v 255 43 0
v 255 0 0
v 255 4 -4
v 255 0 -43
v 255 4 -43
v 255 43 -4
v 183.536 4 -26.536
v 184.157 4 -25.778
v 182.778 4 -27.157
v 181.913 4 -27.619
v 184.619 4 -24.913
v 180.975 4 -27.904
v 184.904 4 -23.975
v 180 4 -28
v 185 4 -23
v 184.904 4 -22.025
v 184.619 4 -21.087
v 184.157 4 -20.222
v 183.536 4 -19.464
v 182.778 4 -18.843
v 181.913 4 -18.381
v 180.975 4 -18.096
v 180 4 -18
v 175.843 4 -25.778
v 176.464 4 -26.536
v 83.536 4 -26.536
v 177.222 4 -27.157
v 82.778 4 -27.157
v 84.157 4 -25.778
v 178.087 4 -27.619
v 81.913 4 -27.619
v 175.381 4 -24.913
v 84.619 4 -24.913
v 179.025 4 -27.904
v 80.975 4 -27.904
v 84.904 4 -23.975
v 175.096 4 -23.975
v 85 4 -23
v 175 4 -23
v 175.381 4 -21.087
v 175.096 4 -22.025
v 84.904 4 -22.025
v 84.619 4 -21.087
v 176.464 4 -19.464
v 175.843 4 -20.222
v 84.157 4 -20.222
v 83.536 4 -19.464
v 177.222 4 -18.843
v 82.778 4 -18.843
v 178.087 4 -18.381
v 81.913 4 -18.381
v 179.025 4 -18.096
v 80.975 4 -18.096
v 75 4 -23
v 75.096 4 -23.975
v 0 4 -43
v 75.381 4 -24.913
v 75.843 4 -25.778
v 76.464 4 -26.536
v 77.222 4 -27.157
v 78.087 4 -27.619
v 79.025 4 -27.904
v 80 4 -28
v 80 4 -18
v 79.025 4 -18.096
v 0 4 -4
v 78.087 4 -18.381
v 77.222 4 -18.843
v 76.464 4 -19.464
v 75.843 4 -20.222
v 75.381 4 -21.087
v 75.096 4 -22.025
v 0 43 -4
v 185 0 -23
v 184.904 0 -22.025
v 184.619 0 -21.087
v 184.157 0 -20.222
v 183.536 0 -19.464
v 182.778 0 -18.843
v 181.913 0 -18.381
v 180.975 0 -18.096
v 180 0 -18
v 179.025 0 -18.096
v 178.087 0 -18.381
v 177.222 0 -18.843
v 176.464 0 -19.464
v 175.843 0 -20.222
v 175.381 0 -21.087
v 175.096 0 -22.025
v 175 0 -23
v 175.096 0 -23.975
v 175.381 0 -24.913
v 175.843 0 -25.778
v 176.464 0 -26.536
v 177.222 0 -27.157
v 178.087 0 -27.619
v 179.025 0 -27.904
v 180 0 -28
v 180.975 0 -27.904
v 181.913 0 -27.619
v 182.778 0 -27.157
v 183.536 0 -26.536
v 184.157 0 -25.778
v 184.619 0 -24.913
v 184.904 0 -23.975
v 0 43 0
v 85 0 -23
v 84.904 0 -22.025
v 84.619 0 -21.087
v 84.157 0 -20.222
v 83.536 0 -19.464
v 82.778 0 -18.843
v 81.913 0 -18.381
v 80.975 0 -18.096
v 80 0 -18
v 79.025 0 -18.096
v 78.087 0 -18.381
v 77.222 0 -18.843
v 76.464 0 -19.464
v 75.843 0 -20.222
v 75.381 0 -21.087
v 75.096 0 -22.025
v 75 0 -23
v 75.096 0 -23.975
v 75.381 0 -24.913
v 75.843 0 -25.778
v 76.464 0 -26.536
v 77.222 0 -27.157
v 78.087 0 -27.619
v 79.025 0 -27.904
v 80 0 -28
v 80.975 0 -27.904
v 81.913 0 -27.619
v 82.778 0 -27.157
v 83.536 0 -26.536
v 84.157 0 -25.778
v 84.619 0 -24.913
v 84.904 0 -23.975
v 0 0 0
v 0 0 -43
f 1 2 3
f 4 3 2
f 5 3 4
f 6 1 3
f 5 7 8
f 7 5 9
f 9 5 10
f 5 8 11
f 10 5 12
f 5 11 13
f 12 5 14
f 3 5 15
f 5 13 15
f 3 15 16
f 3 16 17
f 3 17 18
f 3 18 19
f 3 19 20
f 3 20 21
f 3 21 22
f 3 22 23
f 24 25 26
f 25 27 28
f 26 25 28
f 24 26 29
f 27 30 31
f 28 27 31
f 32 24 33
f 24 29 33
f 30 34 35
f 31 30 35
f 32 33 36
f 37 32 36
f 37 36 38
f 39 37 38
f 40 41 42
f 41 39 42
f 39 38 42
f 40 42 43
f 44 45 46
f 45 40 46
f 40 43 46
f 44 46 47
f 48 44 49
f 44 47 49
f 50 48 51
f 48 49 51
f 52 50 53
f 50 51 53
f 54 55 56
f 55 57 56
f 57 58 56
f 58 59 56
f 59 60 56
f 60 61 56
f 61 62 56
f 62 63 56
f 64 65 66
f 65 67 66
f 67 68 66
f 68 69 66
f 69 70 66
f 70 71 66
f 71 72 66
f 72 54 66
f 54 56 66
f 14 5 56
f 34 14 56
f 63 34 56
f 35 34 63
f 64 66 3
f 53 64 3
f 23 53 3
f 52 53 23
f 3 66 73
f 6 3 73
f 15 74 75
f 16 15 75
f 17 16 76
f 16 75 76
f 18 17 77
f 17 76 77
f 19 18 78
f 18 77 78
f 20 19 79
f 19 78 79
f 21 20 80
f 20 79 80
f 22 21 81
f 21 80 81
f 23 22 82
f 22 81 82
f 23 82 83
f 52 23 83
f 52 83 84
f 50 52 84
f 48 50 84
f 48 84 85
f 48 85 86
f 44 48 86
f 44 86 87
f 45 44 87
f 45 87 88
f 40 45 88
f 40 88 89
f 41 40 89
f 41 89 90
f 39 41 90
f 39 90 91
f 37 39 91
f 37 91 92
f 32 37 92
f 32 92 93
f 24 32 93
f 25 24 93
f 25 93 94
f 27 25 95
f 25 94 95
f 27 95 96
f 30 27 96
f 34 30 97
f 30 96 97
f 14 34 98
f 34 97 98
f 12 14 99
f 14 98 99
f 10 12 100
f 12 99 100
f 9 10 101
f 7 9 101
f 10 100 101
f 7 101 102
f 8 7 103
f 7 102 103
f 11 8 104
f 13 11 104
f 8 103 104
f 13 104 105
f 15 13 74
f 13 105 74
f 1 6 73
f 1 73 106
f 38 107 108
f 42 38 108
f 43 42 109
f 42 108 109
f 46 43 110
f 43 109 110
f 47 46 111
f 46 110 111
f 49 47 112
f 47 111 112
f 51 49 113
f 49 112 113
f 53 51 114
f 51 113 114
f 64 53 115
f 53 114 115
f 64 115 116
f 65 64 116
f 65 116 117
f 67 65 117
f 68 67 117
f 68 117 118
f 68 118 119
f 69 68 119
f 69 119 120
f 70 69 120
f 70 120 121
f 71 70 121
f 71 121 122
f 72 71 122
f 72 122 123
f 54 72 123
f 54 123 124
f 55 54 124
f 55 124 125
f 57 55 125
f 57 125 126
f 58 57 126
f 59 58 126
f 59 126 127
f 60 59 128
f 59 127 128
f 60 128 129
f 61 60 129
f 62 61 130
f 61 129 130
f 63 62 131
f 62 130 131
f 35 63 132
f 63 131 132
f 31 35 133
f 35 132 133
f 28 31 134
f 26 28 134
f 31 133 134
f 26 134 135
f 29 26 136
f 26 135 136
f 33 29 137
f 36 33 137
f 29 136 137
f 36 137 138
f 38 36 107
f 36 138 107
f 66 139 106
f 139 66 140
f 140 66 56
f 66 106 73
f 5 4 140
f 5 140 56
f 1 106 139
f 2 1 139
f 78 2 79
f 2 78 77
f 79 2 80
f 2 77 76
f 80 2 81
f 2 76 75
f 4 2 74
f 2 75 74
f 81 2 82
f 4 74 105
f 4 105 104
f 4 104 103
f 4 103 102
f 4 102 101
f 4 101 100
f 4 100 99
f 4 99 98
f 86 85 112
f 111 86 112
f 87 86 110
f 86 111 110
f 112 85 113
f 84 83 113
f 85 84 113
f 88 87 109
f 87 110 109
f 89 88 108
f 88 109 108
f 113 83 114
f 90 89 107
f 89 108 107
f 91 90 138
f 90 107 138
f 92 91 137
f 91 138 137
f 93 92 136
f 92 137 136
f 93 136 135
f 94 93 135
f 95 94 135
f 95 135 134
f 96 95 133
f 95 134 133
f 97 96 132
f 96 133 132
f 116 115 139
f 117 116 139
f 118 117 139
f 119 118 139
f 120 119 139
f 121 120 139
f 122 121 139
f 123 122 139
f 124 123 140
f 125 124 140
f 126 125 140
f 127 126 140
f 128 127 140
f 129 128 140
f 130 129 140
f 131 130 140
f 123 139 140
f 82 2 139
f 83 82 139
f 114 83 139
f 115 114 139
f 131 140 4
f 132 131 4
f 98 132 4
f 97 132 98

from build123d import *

# Parameters (mm, degrees)
EXTRUDE_1_DEPTH     = 255
SKETCH_2_R          = 5
CUT_EXTRUDE_1_DEPTH = 44


with BuildPart() as part:
    # Эскиз1 → Вытянуть-Тонкостенный1 (new body)
    with BuildSketch(Plane(origin=(0, 0, 0), x_dir=(0, 0, -1), z_dir=(1, 0, 0))):
        Polygon((0, 43), (0, 0), (43, 0), (43, 4), (4, 4), (4, 43), align=None)
    extrude(amount=EXTRUDE_1_DEPTH)

    # Эскиз2 → Вырез-Вытянуть1 (cut, through all)
    with BuildSketch(Plane.XZ):
        with Locations((80, -23)):
            Circle(SKETCH_2_R)
        with Locations((180, -23)):
            Circle(SKETCH_2_R)
    extrude(amount=-CUT_EXTRUDE_1_DEPTH, mode=Mode.SUBTRACT)


solid = part.part
